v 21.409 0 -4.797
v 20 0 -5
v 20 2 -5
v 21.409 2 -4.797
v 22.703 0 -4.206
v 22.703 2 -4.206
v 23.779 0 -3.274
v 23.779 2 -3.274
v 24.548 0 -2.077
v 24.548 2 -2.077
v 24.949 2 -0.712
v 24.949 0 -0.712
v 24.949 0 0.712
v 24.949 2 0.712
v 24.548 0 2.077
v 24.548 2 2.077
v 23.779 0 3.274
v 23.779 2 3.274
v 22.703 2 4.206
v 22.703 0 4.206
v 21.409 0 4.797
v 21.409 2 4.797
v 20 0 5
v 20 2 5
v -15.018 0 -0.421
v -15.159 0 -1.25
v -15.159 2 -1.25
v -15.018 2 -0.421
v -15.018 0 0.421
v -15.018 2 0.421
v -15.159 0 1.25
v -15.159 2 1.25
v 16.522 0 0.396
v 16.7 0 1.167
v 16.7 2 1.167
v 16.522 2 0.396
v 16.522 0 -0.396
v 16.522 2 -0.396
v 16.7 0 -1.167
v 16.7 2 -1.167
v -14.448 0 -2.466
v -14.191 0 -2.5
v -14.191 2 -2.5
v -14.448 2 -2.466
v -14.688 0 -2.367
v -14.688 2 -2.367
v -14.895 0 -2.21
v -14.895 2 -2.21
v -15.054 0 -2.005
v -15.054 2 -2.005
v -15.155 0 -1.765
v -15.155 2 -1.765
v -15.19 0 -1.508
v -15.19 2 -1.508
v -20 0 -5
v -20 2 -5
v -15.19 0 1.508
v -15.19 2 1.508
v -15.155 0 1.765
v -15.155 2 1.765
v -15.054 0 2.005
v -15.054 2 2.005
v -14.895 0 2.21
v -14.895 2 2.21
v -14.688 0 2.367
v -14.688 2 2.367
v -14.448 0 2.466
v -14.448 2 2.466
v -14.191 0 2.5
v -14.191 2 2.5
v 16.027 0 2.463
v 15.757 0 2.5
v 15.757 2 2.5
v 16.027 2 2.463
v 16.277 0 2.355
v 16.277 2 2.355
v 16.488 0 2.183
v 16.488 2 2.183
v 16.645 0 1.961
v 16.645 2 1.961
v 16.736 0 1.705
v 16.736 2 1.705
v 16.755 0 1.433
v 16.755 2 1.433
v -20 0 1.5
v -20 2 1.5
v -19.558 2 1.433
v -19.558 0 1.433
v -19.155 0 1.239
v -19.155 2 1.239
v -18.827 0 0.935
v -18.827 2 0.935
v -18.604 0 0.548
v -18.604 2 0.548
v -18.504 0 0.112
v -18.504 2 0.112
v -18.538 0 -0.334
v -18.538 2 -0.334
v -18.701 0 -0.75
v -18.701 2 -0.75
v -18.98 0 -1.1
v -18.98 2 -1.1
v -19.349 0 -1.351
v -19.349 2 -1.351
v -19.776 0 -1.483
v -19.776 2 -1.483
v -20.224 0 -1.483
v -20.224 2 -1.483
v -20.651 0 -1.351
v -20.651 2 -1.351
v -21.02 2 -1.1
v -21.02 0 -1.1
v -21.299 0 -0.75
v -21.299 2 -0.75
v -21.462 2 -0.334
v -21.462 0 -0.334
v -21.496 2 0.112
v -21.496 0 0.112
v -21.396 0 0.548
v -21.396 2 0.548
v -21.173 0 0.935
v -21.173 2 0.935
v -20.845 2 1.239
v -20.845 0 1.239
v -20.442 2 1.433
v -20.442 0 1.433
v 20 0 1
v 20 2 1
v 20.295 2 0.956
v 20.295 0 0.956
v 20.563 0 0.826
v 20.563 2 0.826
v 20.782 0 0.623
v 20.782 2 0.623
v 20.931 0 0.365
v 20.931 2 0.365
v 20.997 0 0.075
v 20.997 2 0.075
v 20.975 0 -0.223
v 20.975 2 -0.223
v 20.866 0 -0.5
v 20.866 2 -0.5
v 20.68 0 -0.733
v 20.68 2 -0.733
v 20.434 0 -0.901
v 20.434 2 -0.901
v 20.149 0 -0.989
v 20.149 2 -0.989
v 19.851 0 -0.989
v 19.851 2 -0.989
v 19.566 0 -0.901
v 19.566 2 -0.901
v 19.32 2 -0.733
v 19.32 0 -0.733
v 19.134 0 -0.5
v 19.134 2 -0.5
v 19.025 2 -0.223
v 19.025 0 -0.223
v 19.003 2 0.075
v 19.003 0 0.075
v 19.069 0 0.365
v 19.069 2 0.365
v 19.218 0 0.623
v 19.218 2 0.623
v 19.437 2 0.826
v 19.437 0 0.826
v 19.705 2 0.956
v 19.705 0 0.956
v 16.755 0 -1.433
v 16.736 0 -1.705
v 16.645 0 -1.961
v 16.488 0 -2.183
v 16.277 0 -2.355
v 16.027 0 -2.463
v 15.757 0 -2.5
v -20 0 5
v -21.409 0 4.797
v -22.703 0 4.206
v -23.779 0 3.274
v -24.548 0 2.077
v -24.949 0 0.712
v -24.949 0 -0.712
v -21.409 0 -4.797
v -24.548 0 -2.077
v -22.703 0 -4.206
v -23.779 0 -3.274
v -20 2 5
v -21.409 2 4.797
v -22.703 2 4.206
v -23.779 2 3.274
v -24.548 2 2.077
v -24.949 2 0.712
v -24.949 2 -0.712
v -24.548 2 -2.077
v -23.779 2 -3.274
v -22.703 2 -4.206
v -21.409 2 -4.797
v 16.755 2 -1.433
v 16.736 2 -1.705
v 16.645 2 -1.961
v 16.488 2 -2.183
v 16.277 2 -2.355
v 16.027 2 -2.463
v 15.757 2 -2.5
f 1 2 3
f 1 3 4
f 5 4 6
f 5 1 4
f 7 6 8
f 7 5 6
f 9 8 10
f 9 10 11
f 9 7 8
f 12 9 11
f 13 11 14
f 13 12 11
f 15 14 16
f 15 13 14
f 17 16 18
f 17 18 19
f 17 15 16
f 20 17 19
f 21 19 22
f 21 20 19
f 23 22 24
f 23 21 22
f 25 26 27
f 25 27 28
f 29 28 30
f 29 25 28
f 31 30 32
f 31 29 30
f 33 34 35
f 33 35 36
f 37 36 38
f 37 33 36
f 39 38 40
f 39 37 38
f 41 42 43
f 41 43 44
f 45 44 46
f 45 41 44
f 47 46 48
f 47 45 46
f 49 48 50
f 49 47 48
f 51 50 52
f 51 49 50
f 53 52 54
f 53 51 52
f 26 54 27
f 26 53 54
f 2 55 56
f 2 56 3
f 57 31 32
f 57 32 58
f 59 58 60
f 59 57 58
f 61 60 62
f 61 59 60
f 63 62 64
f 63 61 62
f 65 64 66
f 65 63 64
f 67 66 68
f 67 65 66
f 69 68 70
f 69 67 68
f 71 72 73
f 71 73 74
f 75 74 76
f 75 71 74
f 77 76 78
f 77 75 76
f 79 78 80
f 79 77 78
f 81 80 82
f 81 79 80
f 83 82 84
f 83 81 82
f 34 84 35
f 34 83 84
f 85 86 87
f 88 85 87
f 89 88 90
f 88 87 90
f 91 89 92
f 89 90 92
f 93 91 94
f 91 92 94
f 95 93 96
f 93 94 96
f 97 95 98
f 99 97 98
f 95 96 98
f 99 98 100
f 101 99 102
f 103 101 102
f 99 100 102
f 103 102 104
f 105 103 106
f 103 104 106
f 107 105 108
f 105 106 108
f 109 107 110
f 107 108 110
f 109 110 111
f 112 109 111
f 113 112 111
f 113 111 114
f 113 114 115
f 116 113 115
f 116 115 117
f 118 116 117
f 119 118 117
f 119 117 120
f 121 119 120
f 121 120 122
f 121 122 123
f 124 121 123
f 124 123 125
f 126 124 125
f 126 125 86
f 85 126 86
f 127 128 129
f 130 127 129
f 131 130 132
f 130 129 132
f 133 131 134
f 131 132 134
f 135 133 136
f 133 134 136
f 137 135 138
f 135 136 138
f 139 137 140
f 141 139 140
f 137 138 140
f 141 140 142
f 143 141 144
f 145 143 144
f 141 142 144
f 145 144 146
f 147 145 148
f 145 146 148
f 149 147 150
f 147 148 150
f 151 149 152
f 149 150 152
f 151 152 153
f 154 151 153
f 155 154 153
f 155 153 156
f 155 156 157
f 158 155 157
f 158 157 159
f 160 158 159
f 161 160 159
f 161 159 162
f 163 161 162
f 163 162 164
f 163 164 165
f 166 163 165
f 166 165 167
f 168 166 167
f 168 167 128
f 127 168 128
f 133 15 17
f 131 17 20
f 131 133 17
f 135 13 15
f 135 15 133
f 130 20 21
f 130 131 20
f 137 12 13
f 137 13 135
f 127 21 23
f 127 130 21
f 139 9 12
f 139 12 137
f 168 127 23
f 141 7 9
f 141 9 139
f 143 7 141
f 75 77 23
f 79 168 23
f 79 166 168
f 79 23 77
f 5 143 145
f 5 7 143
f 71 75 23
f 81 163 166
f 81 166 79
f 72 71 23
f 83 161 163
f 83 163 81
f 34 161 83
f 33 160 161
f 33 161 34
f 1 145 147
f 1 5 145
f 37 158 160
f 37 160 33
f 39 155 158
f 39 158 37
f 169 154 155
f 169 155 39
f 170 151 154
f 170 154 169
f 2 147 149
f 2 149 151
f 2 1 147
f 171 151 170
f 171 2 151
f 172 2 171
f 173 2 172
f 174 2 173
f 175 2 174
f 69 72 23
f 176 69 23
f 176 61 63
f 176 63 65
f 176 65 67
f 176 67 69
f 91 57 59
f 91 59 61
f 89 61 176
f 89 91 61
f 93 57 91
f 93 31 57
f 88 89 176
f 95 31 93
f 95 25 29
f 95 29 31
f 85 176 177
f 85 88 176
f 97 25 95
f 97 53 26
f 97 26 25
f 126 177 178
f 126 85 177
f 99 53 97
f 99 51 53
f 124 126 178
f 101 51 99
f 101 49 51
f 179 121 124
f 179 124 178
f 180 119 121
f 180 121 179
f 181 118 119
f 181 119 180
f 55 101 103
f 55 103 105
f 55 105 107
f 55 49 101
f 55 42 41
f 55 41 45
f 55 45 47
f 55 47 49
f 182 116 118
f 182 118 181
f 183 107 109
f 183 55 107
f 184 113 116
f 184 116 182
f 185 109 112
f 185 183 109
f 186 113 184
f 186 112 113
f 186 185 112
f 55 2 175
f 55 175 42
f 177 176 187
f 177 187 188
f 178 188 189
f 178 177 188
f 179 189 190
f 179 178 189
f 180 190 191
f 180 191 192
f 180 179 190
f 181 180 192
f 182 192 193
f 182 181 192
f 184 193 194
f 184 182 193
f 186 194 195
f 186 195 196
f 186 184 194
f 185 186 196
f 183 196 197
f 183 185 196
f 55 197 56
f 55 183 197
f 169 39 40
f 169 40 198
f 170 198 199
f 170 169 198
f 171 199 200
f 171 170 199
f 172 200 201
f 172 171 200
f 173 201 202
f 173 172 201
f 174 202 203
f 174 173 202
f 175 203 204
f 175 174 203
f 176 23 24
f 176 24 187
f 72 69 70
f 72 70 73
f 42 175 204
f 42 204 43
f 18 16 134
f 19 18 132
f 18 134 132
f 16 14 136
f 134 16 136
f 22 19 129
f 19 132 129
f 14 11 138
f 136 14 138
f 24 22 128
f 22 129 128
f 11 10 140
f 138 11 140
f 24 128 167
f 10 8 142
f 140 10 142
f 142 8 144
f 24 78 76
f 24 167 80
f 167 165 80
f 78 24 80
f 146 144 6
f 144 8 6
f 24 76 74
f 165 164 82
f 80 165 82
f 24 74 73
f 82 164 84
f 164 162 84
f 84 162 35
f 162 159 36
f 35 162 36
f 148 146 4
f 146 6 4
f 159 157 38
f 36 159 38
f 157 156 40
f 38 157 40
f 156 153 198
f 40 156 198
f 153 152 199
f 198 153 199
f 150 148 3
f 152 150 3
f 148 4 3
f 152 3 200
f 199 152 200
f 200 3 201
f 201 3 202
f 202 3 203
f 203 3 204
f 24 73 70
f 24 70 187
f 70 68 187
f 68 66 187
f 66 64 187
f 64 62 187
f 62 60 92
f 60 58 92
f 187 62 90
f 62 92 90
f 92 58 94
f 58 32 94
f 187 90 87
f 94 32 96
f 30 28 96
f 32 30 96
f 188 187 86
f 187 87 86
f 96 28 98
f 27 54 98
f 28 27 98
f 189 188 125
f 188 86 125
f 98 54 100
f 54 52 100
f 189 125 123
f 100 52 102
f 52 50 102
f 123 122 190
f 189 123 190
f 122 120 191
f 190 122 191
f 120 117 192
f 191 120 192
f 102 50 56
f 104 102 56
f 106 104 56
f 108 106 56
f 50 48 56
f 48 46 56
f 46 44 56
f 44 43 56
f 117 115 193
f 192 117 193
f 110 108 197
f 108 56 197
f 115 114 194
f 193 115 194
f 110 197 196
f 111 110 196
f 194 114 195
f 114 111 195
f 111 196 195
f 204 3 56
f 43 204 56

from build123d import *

# Parameters (mm, degrees)
BOSS_EXTRUDE1_DEPTH = 2
SKETCH4_R           = 1
CUT_EXTRUDE3_DEPTH  = 12.7
SKETCH5_R           = 1.5
CUT_EXTRUDE4_DEPTH  = 10
CUT_EXTRUDE5_REACH  = 27.573


with BuildPart() as part:
    # Sketch1 → Boss-Extrude1 (new body)
    with BuildSketch(Plane(origin=(0, 0, 0), x_dir=(1, 0, 0), z_dir=(0, 1, 0))):
        with BuildLine():
            Line((-20, 5), (20, 5))
            ThreePointArc((20, 5), (25, 0), (20, -5))
            Line((20, -5), (-20, -5))
            ThreePointArc((-20, -5), (-25, 0), (-20, 5))
        make_face()
    extrude(amount=BOSS_EXTRUDE1_DEPTH)

    # Sketch4 → Cut-Extrude3 (cut)
    with BuildSketch(Plane(origin=(0, 2, 0), x_dir=(1, 0, 0), z_dir=(0, 1, 0))):
        with Locations(Location((20, 0, 0), (0, 0, 270))):
            Circle(SKETCH4_R)
    extrude(amount=-CUT_EXTRUDE3_DEPTH, mode=Mode.SUBTRACT)

    # Sketch5 → Cut-Extrude4 (cut)
    with BuildSketch(Plane(origin=(0, 2, 0), x_dir=(1, 0, 0), z_dir=(0, 1, 0))):
        with Locations(Location((-20, 0, 0), (0, 0, 270))):
            Circle(SKETCH5_R)
    extrude(amount=-CUT_EXTRUDE4_DEPTH, mode=Mode.SUBTRACT)

    # Sketch6 → Cut-Extrude5 (cut, up to next)
    with BuildSketch(Plane.XZ, mode=Mode.PRIVATE) as cut_extrude5_sk1:
        with BuildLine():
            Line((15.757359313, -2.5), (-14.190524981, -2.5))
            ThreePointArc((-14.190524981, -2.5), (-14.981094396, -2.112372436), (-15.158770817, -1.25))
            ThreePointArc((-15.158770817, -1.25), (-15, 0), (-15.158770817, 1.25))
            ThreePointArc((-15.158770817, 1.25), (-14.981094396, 2.112372436), (-14.190524981, 2.5))
            Line((-14.190524981, 2.5), (15.757359313, 2.5))
            ThreePointArc((15.757359313, 2.5), (16.573855894, 2.077350269), (16.700168354, 1.166666667))
            ThreePointArc((16.700168354, 1.166666667), (16.5, 0), (16.700168354, -1.166666667))
            ThreePointArc((16.700168354, -1.166666667), (16.573855894, -2.077350269), (15.757359313, -2.5))
        make_face()
    cut_extrude5_tool1 = extrude(cut_extrude5_sk1.sketch, amount=-CUT_EXTRUDE5_REACH, mode=Mode.PRIVATE) & part.part
    add(cut_extrude5_tool1.solids().sort_by_distance((0.772522, 0, 0))[0], mode=Mode.SUBTRACT)


solid = part.part
